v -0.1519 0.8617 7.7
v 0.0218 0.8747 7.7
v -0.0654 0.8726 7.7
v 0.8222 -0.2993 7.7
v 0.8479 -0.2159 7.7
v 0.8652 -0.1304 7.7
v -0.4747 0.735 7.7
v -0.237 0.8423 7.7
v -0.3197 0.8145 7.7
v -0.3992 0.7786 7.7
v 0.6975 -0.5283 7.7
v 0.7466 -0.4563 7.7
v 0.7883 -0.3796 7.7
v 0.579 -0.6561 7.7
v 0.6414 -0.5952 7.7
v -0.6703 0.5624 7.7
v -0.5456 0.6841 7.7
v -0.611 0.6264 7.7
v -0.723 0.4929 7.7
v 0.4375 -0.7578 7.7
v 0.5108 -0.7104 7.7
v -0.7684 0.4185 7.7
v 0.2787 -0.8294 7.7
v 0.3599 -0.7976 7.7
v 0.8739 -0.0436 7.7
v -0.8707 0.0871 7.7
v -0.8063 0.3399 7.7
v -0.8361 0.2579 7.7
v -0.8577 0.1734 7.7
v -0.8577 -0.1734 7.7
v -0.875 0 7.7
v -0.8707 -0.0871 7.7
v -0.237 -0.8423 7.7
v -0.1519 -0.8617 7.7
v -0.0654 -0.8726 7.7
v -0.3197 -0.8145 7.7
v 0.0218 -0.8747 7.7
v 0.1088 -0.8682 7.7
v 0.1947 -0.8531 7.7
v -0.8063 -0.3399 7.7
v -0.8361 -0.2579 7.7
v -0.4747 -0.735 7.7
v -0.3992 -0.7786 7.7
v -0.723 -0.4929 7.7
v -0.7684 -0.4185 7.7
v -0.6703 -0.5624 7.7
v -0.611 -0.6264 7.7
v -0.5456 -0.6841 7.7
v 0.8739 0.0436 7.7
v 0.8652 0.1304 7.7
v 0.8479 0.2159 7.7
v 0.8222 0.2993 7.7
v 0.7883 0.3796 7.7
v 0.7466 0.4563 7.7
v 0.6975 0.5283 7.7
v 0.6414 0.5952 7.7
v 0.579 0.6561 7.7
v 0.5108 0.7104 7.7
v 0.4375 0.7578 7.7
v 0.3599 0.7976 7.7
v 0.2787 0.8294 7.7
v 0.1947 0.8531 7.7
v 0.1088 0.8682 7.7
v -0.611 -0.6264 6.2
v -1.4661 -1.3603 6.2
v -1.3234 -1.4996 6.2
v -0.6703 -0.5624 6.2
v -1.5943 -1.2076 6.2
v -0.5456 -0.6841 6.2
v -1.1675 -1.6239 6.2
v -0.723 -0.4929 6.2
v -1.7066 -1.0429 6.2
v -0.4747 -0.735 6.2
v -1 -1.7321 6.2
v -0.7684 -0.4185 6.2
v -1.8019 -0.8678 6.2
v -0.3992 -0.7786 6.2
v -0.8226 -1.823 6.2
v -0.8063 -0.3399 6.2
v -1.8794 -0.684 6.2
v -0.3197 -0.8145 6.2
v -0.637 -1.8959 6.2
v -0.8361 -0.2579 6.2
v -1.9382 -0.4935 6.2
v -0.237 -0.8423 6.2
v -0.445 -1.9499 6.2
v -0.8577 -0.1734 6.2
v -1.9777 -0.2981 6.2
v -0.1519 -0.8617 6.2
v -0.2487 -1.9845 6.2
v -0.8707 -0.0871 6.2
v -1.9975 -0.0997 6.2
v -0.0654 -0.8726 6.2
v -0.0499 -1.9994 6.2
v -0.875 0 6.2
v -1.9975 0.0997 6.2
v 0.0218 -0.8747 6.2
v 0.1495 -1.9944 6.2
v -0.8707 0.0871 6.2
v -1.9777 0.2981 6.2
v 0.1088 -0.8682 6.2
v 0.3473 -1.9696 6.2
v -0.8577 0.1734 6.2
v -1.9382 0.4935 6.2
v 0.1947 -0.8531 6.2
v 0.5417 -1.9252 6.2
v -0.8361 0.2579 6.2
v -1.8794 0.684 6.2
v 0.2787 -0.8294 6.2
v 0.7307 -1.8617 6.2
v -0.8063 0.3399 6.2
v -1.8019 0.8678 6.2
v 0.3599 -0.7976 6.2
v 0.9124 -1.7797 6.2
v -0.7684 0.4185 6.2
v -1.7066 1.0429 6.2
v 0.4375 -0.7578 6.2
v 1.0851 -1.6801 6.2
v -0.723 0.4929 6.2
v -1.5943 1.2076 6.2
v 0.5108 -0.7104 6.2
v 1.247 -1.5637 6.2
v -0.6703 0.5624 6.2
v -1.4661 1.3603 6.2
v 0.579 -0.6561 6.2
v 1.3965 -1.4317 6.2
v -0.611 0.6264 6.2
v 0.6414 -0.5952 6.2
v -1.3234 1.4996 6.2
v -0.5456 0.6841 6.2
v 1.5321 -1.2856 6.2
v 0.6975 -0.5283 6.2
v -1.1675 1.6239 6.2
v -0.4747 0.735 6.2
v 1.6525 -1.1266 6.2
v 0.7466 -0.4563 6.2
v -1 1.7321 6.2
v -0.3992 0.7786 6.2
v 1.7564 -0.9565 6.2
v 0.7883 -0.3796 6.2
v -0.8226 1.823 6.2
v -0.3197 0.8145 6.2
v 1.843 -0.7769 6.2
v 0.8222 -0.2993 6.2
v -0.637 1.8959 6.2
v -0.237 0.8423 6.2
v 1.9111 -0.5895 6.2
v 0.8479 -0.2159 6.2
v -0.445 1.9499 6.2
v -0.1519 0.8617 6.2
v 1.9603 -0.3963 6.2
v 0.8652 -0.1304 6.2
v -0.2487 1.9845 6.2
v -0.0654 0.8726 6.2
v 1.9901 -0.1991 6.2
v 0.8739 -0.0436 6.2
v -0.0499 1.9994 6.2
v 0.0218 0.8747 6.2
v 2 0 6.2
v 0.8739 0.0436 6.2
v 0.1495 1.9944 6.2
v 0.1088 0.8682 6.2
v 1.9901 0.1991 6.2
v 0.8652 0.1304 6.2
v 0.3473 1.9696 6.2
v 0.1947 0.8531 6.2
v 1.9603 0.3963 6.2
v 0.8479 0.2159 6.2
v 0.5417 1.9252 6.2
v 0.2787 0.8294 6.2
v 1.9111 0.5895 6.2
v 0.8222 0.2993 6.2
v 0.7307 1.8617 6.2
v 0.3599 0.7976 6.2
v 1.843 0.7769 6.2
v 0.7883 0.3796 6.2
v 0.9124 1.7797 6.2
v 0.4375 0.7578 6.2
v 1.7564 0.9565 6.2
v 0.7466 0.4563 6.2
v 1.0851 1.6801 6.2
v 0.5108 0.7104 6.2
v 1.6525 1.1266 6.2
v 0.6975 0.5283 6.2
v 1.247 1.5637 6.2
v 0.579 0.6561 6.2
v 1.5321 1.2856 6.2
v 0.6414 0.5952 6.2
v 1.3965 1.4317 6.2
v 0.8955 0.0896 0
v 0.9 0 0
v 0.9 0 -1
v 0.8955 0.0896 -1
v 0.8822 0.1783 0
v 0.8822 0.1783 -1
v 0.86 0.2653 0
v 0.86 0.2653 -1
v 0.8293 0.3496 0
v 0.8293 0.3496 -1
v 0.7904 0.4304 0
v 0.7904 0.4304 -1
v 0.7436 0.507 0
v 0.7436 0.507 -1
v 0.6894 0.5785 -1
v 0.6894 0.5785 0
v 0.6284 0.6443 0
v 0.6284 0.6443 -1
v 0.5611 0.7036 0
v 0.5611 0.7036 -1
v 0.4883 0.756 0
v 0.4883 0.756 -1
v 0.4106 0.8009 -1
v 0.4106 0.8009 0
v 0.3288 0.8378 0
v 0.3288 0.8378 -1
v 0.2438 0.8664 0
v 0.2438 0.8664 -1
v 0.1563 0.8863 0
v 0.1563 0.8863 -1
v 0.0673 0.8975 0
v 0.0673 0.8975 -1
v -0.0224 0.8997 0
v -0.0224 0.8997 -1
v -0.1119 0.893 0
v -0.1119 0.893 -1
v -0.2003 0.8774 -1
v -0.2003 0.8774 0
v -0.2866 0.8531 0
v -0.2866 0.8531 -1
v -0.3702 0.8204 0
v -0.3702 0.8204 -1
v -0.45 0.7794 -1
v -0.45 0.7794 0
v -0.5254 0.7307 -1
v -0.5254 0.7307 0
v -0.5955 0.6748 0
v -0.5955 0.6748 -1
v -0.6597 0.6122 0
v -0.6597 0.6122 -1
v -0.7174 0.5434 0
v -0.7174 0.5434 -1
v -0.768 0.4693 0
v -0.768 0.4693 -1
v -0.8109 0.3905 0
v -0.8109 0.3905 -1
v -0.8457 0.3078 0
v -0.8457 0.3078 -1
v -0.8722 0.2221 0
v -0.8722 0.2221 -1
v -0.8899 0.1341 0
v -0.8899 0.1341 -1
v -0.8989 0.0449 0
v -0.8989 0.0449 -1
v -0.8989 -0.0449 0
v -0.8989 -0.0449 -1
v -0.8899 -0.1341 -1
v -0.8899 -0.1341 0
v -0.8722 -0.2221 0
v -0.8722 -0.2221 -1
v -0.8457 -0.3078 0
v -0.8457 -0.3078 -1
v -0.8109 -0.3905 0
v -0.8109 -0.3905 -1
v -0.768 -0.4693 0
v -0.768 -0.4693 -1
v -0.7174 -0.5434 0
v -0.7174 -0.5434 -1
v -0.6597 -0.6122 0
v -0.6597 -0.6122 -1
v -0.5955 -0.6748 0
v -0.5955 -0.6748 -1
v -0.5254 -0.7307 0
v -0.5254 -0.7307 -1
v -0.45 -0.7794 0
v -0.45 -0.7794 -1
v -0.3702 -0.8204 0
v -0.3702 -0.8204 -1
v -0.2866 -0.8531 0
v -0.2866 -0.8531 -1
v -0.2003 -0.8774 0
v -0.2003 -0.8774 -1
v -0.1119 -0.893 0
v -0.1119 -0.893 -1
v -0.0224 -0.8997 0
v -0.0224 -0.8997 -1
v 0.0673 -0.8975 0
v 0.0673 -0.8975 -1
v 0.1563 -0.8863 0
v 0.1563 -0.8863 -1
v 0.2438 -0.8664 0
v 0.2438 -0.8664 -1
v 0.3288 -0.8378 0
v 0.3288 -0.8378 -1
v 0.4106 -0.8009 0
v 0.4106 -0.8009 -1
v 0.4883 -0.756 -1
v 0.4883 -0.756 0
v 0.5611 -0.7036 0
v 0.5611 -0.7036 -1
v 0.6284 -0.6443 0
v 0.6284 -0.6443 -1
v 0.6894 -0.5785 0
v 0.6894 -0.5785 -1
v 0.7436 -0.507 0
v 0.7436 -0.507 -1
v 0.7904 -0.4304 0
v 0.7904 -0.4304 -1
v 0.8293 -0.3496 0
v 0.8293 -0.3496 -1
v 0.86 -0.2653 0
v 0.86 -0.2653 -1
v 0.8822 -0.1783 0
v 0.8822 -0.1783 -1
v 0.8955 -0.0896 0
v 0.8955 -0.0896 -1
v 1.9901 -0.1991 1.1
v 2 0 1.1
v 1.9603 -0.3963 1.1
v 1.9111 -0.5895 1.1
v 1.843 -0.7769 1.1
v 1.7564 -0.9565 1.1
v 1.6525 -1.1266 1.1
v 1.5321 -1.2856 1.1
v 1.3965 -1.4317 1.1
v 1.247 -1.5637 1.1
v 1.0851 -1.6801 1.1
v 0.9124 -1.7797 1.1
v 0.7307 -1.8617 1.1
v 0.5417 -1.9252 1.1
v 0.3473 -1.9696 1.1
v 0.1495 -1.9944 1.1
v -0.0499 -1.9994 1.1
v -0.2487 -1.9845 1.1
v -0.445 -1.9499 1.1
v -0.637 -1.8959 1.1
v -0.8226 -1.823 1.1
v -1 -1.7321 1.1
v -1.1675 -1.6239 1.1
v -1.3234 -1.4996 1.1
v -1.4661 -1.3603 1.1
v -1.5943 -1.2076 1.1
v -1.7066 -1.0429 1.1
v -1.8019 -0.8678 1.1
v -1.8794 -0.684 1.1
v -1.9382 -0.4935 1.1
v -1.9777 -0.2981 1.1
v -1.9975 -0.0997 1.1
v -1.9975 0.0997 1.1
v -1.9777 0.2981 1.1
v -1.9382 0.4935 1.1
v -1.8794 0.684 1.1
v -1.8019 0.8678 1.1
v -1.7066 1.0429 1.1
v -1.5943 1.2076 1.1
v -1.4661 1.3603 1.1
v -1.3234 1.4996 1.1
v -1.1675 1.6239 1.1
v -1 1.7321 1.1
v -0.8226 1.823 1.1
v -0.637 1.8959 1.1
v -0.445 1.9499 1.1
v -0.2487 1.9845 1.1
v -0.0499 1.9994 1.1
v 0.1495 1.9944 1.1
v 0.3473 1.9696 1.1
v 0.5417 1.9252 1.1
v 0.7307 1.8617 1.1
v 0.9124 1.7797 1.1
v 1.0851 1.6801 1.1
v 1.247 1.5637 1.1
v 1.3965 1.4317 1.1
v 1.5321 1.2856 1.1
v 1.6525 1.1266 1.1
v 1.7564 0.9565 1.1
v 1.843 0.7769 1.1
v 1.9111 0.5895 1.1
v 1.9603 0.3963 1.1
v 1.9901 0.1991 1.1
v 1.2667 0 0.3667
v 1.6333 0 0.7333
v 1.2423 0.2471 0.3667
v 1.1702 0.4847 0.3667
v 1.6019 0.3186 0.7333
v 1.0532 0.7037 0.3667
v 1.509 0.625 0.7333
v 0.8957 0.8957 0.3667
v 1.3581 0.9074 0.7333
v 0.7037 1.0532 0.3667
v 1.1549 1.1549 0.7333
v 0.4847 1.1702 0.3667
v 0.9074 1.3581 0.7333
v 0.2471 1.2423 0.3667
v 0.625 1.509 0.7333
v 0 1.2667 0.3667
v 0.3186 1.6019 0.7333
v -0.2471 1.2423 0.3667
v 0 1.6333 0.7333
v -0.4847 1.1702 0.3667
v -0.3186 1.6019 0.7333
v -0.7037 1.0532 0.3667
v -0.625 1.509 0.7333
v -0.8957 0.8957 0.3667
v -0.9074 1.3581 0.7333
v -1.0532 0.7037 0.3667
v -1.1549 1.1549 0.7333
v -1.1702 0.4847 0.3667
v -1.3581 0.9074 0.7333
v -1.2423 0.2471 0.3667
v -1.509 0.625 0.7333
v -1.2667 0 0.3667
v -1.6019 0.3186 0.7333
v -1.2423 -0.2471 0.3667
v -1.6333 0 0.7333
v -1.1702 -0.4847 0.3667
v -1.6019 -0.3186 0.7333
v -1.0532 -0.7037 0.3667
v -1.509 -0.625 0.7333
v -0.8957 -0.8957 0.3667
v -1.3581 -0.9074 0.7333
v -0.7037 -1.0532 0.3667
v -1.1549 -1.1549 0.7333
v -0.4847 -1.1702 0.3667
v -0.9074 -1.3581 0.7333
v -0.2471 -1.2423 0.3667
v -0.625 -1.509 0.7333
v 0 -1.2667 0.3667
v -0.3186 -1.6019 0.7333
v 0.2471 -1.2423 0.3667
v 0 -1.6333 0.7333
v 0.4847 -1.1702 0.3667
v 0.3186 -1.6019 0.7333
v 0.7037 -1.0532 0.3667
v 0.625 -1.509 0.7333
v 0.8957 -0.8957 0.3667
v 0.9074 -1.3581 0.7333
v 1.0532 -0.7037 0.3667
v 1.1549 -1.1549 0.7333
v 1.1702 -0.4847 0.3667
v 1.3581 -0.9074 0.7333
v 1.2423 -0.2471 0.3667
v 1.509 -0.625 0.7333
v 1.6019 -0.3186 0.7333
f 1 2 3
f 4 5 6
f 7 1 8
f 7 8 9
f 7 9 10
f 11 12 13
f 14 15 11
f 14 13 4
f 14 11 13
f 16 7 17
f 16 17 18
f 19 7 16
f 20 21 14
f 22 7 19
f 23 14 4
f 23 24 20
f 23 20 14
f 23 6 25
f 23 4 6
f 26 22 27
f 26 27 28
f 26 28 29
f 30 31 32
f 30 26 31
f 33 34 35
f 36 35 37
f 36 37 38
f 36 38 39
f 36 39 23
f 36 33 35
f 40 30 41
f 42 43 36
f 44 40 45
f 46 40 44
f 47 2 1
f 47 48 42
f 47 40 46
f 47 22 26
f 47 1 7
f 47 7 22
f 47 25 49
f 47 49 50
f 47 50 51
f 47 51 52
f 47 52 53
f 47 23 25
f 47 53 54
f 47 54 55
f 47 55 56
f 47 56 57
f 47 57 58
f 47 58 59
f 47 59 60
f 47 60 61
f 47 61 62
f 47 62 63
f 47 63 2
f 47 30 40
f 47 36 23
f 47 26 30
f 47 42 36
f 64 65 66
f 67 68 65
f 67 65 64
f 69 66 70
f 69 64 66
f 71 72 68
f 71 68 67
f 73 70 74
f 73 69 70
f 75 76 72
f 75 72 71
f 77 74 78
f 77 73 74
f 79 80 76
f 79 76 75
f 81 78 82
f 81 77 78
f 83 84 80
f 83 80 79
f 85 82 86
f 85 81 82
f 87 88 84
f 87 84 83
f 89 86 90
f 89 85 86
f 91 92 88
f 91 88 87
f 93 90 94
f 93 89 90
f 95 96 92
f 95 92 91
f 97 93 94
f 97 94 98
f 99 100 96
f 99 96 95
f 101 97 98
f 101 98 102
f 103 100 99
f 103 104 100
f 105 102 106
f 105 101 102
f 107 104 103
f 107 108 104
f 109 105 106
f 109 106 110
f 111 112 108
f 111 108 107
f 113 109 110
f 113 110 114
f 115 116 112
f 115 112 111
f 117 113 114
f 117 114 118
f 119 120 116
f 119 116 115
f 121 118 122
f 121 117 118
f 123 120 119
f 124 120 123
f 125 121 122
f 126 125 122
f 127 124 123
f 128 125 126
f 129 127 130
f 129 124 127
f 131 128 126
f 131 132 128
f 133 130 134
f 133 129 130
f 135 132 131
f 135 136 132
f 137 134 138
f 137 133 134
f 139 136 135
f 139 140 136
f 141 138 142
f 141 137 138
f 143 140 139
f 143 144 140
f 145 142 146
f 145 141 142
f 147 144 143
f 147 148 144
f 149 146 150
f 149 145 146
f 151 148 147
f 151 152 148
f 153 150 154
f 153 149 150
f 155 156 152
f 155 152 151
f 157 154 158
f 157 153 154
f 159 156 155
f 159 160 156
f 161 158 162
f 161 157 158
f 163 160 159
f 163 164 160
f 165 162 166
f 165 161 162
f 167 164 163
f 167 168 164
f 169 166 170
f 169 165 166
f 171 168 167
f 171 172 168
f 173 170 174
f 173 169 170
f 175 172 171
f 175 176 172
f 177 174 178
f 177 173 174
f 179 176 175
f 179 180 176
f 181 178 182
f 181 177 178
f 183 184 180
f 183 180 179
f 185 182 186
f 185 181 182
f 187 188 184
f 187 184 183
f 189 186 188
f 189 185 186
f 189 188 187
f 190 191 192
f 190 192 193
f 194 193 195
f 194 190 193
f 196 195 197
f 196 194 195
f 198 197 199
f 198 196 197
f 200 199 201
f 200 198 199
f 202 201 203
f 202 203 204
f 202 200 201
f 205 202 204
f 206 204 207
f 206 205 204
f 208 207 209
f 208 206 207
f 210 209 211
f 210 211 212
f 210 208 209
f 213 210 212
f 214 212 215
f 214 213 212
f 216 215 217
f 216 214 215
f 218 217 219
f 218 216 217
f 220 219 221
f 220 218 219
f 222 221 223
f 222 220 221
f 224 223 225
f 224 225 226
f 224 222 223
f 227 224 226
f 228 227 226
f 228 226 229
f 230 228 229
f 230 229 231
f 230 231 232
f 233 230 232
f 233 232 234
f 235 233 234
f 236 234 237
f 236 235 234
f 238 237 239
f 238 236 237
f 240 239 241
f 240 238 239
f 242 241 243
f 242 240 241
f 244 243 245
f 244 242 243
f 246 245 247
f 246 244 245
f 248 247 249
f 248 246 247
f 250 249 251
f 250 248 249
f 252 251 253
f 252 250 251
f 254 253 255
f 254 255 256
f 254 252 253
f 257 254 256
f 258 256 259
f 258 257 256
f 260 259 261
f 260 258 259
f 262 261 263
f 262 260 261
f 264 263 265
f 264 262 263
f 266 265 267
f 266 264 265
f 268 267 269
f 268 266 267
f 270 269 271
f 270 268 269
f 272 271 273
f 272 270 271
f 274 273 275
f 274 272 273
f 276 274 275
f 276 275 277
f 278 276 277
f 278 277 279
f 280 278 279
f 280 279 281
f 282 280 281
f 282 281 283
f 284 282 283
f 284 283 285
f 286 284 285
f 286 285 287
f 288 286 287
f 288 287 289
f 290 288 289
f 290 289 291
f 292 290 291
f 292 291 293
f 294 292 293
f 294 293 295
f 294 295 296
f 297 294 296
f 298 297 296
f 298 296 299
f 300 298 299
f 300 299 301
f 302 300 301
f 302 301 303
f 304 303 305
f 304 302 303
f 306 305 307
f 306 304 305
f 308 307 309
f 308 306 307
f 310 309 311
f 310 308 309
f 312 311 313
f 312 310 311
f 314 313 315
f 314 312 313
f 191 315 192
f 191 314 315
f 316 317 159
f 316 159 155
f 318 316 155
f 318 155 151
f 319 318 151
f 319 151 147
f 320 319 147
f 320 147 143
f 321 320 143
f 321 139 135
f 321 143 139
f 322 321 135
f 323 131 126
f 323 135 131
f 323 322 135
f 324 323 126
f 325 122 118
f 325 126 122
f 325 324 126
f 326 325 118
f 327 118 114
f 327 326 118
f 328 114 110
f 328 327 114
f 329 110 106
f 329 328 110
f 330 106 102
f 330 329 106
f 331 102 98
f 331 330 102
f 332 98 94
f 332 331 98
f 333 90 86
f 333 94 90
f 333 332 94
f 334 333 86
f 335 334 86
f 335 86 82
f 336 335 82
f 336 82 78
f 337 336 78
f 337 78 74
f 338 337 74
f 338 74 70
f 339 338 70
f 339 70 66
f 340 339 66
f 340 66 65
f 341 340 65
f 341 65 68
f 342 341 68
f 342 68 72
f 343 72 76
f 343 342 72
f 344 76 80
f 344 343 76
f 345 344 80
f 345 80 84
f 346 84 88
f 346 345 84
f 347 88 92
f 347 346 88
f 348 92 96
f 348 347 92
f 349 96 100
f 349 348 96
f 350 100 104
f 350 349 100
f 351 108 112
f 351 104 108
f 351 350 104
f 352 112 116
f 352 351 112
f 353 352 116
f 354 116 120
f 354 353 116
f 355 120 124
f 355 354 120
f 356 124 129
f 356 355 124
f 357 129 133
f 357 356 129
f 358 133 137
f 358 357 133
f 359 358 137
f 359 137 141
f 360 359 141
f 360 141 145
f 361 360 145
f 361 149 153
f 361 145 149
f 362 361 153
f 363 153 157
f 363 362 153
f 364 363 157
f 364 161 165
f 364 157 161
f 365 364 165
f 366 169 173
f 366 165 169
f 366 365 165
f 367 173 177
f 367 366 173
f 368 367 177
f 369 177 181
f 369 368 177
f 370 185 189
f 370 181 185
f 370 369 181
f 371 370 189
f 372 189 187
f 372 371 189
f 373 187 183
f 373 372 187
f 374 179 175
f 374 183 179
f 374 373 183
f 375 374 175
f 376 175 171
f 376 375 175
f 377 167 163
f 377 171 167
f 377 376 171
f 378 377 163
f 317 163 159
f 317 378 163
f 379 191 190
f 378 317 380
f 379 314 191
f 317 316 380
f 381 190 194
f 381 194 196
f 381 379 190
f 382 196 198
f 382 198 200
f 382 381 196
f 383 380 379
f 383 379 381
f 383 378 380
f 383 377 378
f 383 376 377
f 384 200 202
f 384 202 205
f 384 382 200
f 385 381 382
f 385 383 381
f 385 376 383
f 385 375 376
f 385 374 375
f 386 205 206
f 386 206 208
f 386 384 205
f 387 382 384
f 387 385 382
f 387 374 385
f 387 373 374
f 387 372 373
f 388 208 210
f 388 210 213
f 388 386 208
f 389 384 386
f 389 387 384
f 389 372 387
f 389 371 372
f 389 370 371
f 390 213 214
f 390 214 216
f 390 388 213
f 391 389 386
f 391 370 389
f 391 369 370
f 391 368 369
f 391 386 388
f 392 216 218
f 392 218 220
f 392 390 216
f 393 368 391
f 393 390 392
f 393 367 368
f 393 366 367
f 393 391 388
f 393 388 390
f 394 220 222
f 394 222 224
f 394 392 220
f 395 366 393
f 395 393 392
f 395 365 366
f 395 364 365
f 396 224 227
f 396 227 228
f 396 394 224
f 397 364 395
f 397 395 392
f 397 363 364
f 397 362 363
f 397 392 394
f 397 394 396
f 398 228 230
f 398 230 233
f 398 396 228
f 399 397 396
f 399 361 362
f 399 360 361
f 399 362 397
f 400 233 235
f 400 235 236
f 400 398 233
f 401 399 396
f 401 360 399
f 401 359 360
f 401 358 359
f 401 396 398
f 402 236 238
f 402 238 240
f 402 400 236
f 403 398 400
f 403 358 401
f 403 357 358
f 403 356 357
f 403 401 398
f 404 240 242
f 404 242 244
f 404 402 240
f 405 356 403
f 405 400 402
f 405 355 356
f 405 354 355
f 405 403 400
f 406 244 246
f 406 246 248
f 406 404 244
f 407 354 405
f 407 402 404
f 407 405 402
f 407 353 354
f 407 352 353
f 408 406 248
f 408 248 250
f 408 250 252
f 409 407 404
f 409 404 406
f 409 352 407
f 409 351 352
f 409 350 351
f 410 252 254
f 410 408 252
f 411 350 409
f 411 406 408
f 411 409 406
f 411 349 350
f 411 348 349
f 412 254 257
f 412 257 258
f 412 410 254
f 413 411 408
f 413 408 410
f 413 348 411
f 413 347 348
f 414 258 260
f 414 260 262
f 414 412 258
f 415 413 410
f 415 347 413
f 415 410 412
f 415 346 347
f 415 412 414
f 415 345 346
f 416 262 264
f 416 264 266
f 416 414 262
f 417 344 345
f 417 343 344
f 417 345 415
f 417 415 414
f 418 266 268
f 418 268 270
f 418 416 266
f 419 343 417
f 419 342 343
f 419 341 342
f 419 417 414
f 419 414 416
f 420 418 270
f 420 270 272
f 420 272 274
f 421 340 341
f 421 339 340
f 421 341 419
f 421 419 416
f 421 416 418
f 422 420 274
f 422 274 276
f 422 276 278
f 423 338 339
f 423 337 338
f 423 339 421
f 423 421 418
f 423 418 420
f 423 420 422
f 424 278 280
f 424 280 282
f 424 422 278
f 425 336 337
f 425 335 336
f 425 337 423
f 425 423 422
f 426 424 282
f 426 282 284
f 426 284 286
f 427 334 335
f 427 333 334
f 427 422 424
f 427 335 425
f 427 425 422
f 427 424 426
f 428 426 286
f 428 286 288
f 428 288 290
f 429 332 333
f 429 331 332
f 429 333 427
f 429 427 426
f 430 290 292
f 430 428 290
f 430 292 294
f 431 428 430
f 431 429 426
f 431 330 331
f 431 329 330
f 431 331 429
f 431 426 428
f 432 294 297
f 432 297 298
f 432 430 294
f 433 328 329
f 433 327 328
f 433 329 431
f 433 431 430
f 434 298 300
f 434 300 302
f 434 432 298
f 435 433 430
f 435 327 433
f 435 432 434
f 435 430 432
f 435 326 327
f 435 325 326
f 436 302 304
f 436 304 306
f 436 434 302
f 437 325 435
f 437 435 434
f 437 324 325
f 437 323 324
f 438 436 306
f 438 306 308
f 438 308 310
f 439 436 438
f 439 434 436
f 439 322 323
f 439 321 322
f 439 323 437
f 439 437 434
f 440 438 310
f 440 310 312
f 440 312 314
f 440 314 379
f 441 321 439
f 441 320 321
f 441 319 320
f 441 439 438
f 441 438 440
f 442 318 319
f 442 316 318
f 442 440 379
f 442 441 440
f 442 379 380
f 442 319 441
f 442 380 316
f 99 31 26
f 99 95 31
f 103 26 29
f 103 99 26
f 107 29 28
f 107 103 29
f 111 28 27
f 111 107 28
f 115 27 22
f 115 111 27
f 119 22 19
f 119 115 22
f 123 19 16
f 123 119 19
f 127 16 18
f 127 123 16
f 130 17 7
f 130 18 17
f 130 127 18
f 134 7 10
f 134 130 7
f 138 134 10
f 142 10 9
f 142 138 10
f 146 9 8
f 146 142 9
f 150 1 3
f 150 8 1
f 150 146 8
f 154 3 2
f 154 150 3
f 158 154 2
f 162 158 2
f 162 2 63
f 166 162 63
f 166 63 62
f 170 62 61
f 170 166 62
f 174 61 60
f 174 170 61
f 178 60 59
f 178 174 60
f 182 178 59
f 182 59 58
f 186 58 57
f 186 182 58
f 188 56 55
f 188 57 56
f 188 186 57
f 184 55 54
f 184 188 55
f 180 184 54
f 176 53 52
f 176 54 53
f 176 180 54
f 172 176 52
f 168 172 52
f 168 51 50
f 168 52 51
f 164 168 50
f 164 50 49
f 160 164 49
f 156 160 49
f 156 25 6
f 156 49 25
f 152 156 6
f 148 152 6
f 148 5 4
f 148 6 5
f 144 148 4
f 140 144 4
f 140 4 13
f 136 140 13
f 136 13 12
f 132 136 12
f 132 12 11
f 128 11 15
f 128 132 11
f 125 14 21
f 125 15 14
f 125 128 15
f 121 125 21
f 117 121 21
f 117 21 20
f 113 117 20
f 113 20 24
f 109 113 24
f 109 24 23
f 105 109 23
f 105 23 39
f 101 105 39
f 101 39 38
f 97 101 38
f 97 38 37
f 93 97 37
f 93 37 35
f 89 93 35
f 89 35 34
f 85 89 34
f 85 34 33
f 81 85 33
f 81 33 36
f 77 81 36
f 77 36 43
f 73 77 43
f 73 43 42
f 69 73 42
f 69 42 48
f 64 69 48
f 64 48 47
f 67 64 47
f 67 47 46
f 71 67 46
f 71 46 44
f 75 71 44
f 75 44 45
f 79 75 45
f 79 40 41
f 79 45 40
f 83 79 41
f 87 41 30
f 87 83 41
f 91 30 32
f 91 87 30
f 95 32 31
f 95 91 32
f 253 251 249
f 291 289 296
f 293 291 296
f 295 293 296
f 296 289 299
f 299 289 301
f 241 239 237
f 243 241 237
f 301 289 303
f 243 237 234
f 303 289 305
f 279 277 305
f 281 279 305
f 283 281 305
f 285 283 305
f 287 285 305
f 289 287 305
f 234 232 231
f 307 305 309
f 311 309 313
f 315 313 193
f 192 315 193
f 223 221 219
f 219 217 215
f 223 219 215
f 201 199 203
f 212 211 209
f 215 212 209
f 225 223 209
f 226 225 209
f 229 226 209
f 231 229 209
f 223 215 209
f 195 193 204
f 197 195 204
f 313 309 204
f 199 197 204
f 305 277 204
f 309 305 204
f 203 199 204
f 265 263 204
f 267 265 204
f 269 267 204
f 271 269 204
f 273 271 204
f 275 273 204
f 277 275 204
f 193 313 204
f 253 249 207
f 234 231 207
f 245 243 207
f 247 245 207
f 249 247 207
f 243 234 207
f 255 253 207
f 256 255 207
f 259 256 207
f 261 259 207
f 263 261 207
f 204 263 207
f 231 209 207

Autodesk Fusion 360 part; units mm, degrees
sketch "Sketch1" plane through (0, 0, 0) normal (0, 0, 1) x (1, 0, 0)
  circle A0 centre (0, 0) radius 2
  dimension "d1" = 4
extrude "Extrude1" add sketch "Sketch1" along normal blind 6.2
sketch "Sketch2" plane through (0, 0, 6.2) normal (0, 0, 1) x (-1, 0, 0)
  circle A0 centre (0, 0) radius 2
  circle A1 centre (0, 0) radius 0.875
  dimension "d4" = 1.75
extrude "Extrude2" add sketch "Sketch2" along normal blind 1.5 contours A1
chamfer "Chamfer2" distance 1.1 angle 45 1 edges at (-1.8647, -0.7232, 0)
extrude "Extrude4" add 1 faces at (0.4737, -0.323, 0) along direction (0, 0, -1) blind 1
